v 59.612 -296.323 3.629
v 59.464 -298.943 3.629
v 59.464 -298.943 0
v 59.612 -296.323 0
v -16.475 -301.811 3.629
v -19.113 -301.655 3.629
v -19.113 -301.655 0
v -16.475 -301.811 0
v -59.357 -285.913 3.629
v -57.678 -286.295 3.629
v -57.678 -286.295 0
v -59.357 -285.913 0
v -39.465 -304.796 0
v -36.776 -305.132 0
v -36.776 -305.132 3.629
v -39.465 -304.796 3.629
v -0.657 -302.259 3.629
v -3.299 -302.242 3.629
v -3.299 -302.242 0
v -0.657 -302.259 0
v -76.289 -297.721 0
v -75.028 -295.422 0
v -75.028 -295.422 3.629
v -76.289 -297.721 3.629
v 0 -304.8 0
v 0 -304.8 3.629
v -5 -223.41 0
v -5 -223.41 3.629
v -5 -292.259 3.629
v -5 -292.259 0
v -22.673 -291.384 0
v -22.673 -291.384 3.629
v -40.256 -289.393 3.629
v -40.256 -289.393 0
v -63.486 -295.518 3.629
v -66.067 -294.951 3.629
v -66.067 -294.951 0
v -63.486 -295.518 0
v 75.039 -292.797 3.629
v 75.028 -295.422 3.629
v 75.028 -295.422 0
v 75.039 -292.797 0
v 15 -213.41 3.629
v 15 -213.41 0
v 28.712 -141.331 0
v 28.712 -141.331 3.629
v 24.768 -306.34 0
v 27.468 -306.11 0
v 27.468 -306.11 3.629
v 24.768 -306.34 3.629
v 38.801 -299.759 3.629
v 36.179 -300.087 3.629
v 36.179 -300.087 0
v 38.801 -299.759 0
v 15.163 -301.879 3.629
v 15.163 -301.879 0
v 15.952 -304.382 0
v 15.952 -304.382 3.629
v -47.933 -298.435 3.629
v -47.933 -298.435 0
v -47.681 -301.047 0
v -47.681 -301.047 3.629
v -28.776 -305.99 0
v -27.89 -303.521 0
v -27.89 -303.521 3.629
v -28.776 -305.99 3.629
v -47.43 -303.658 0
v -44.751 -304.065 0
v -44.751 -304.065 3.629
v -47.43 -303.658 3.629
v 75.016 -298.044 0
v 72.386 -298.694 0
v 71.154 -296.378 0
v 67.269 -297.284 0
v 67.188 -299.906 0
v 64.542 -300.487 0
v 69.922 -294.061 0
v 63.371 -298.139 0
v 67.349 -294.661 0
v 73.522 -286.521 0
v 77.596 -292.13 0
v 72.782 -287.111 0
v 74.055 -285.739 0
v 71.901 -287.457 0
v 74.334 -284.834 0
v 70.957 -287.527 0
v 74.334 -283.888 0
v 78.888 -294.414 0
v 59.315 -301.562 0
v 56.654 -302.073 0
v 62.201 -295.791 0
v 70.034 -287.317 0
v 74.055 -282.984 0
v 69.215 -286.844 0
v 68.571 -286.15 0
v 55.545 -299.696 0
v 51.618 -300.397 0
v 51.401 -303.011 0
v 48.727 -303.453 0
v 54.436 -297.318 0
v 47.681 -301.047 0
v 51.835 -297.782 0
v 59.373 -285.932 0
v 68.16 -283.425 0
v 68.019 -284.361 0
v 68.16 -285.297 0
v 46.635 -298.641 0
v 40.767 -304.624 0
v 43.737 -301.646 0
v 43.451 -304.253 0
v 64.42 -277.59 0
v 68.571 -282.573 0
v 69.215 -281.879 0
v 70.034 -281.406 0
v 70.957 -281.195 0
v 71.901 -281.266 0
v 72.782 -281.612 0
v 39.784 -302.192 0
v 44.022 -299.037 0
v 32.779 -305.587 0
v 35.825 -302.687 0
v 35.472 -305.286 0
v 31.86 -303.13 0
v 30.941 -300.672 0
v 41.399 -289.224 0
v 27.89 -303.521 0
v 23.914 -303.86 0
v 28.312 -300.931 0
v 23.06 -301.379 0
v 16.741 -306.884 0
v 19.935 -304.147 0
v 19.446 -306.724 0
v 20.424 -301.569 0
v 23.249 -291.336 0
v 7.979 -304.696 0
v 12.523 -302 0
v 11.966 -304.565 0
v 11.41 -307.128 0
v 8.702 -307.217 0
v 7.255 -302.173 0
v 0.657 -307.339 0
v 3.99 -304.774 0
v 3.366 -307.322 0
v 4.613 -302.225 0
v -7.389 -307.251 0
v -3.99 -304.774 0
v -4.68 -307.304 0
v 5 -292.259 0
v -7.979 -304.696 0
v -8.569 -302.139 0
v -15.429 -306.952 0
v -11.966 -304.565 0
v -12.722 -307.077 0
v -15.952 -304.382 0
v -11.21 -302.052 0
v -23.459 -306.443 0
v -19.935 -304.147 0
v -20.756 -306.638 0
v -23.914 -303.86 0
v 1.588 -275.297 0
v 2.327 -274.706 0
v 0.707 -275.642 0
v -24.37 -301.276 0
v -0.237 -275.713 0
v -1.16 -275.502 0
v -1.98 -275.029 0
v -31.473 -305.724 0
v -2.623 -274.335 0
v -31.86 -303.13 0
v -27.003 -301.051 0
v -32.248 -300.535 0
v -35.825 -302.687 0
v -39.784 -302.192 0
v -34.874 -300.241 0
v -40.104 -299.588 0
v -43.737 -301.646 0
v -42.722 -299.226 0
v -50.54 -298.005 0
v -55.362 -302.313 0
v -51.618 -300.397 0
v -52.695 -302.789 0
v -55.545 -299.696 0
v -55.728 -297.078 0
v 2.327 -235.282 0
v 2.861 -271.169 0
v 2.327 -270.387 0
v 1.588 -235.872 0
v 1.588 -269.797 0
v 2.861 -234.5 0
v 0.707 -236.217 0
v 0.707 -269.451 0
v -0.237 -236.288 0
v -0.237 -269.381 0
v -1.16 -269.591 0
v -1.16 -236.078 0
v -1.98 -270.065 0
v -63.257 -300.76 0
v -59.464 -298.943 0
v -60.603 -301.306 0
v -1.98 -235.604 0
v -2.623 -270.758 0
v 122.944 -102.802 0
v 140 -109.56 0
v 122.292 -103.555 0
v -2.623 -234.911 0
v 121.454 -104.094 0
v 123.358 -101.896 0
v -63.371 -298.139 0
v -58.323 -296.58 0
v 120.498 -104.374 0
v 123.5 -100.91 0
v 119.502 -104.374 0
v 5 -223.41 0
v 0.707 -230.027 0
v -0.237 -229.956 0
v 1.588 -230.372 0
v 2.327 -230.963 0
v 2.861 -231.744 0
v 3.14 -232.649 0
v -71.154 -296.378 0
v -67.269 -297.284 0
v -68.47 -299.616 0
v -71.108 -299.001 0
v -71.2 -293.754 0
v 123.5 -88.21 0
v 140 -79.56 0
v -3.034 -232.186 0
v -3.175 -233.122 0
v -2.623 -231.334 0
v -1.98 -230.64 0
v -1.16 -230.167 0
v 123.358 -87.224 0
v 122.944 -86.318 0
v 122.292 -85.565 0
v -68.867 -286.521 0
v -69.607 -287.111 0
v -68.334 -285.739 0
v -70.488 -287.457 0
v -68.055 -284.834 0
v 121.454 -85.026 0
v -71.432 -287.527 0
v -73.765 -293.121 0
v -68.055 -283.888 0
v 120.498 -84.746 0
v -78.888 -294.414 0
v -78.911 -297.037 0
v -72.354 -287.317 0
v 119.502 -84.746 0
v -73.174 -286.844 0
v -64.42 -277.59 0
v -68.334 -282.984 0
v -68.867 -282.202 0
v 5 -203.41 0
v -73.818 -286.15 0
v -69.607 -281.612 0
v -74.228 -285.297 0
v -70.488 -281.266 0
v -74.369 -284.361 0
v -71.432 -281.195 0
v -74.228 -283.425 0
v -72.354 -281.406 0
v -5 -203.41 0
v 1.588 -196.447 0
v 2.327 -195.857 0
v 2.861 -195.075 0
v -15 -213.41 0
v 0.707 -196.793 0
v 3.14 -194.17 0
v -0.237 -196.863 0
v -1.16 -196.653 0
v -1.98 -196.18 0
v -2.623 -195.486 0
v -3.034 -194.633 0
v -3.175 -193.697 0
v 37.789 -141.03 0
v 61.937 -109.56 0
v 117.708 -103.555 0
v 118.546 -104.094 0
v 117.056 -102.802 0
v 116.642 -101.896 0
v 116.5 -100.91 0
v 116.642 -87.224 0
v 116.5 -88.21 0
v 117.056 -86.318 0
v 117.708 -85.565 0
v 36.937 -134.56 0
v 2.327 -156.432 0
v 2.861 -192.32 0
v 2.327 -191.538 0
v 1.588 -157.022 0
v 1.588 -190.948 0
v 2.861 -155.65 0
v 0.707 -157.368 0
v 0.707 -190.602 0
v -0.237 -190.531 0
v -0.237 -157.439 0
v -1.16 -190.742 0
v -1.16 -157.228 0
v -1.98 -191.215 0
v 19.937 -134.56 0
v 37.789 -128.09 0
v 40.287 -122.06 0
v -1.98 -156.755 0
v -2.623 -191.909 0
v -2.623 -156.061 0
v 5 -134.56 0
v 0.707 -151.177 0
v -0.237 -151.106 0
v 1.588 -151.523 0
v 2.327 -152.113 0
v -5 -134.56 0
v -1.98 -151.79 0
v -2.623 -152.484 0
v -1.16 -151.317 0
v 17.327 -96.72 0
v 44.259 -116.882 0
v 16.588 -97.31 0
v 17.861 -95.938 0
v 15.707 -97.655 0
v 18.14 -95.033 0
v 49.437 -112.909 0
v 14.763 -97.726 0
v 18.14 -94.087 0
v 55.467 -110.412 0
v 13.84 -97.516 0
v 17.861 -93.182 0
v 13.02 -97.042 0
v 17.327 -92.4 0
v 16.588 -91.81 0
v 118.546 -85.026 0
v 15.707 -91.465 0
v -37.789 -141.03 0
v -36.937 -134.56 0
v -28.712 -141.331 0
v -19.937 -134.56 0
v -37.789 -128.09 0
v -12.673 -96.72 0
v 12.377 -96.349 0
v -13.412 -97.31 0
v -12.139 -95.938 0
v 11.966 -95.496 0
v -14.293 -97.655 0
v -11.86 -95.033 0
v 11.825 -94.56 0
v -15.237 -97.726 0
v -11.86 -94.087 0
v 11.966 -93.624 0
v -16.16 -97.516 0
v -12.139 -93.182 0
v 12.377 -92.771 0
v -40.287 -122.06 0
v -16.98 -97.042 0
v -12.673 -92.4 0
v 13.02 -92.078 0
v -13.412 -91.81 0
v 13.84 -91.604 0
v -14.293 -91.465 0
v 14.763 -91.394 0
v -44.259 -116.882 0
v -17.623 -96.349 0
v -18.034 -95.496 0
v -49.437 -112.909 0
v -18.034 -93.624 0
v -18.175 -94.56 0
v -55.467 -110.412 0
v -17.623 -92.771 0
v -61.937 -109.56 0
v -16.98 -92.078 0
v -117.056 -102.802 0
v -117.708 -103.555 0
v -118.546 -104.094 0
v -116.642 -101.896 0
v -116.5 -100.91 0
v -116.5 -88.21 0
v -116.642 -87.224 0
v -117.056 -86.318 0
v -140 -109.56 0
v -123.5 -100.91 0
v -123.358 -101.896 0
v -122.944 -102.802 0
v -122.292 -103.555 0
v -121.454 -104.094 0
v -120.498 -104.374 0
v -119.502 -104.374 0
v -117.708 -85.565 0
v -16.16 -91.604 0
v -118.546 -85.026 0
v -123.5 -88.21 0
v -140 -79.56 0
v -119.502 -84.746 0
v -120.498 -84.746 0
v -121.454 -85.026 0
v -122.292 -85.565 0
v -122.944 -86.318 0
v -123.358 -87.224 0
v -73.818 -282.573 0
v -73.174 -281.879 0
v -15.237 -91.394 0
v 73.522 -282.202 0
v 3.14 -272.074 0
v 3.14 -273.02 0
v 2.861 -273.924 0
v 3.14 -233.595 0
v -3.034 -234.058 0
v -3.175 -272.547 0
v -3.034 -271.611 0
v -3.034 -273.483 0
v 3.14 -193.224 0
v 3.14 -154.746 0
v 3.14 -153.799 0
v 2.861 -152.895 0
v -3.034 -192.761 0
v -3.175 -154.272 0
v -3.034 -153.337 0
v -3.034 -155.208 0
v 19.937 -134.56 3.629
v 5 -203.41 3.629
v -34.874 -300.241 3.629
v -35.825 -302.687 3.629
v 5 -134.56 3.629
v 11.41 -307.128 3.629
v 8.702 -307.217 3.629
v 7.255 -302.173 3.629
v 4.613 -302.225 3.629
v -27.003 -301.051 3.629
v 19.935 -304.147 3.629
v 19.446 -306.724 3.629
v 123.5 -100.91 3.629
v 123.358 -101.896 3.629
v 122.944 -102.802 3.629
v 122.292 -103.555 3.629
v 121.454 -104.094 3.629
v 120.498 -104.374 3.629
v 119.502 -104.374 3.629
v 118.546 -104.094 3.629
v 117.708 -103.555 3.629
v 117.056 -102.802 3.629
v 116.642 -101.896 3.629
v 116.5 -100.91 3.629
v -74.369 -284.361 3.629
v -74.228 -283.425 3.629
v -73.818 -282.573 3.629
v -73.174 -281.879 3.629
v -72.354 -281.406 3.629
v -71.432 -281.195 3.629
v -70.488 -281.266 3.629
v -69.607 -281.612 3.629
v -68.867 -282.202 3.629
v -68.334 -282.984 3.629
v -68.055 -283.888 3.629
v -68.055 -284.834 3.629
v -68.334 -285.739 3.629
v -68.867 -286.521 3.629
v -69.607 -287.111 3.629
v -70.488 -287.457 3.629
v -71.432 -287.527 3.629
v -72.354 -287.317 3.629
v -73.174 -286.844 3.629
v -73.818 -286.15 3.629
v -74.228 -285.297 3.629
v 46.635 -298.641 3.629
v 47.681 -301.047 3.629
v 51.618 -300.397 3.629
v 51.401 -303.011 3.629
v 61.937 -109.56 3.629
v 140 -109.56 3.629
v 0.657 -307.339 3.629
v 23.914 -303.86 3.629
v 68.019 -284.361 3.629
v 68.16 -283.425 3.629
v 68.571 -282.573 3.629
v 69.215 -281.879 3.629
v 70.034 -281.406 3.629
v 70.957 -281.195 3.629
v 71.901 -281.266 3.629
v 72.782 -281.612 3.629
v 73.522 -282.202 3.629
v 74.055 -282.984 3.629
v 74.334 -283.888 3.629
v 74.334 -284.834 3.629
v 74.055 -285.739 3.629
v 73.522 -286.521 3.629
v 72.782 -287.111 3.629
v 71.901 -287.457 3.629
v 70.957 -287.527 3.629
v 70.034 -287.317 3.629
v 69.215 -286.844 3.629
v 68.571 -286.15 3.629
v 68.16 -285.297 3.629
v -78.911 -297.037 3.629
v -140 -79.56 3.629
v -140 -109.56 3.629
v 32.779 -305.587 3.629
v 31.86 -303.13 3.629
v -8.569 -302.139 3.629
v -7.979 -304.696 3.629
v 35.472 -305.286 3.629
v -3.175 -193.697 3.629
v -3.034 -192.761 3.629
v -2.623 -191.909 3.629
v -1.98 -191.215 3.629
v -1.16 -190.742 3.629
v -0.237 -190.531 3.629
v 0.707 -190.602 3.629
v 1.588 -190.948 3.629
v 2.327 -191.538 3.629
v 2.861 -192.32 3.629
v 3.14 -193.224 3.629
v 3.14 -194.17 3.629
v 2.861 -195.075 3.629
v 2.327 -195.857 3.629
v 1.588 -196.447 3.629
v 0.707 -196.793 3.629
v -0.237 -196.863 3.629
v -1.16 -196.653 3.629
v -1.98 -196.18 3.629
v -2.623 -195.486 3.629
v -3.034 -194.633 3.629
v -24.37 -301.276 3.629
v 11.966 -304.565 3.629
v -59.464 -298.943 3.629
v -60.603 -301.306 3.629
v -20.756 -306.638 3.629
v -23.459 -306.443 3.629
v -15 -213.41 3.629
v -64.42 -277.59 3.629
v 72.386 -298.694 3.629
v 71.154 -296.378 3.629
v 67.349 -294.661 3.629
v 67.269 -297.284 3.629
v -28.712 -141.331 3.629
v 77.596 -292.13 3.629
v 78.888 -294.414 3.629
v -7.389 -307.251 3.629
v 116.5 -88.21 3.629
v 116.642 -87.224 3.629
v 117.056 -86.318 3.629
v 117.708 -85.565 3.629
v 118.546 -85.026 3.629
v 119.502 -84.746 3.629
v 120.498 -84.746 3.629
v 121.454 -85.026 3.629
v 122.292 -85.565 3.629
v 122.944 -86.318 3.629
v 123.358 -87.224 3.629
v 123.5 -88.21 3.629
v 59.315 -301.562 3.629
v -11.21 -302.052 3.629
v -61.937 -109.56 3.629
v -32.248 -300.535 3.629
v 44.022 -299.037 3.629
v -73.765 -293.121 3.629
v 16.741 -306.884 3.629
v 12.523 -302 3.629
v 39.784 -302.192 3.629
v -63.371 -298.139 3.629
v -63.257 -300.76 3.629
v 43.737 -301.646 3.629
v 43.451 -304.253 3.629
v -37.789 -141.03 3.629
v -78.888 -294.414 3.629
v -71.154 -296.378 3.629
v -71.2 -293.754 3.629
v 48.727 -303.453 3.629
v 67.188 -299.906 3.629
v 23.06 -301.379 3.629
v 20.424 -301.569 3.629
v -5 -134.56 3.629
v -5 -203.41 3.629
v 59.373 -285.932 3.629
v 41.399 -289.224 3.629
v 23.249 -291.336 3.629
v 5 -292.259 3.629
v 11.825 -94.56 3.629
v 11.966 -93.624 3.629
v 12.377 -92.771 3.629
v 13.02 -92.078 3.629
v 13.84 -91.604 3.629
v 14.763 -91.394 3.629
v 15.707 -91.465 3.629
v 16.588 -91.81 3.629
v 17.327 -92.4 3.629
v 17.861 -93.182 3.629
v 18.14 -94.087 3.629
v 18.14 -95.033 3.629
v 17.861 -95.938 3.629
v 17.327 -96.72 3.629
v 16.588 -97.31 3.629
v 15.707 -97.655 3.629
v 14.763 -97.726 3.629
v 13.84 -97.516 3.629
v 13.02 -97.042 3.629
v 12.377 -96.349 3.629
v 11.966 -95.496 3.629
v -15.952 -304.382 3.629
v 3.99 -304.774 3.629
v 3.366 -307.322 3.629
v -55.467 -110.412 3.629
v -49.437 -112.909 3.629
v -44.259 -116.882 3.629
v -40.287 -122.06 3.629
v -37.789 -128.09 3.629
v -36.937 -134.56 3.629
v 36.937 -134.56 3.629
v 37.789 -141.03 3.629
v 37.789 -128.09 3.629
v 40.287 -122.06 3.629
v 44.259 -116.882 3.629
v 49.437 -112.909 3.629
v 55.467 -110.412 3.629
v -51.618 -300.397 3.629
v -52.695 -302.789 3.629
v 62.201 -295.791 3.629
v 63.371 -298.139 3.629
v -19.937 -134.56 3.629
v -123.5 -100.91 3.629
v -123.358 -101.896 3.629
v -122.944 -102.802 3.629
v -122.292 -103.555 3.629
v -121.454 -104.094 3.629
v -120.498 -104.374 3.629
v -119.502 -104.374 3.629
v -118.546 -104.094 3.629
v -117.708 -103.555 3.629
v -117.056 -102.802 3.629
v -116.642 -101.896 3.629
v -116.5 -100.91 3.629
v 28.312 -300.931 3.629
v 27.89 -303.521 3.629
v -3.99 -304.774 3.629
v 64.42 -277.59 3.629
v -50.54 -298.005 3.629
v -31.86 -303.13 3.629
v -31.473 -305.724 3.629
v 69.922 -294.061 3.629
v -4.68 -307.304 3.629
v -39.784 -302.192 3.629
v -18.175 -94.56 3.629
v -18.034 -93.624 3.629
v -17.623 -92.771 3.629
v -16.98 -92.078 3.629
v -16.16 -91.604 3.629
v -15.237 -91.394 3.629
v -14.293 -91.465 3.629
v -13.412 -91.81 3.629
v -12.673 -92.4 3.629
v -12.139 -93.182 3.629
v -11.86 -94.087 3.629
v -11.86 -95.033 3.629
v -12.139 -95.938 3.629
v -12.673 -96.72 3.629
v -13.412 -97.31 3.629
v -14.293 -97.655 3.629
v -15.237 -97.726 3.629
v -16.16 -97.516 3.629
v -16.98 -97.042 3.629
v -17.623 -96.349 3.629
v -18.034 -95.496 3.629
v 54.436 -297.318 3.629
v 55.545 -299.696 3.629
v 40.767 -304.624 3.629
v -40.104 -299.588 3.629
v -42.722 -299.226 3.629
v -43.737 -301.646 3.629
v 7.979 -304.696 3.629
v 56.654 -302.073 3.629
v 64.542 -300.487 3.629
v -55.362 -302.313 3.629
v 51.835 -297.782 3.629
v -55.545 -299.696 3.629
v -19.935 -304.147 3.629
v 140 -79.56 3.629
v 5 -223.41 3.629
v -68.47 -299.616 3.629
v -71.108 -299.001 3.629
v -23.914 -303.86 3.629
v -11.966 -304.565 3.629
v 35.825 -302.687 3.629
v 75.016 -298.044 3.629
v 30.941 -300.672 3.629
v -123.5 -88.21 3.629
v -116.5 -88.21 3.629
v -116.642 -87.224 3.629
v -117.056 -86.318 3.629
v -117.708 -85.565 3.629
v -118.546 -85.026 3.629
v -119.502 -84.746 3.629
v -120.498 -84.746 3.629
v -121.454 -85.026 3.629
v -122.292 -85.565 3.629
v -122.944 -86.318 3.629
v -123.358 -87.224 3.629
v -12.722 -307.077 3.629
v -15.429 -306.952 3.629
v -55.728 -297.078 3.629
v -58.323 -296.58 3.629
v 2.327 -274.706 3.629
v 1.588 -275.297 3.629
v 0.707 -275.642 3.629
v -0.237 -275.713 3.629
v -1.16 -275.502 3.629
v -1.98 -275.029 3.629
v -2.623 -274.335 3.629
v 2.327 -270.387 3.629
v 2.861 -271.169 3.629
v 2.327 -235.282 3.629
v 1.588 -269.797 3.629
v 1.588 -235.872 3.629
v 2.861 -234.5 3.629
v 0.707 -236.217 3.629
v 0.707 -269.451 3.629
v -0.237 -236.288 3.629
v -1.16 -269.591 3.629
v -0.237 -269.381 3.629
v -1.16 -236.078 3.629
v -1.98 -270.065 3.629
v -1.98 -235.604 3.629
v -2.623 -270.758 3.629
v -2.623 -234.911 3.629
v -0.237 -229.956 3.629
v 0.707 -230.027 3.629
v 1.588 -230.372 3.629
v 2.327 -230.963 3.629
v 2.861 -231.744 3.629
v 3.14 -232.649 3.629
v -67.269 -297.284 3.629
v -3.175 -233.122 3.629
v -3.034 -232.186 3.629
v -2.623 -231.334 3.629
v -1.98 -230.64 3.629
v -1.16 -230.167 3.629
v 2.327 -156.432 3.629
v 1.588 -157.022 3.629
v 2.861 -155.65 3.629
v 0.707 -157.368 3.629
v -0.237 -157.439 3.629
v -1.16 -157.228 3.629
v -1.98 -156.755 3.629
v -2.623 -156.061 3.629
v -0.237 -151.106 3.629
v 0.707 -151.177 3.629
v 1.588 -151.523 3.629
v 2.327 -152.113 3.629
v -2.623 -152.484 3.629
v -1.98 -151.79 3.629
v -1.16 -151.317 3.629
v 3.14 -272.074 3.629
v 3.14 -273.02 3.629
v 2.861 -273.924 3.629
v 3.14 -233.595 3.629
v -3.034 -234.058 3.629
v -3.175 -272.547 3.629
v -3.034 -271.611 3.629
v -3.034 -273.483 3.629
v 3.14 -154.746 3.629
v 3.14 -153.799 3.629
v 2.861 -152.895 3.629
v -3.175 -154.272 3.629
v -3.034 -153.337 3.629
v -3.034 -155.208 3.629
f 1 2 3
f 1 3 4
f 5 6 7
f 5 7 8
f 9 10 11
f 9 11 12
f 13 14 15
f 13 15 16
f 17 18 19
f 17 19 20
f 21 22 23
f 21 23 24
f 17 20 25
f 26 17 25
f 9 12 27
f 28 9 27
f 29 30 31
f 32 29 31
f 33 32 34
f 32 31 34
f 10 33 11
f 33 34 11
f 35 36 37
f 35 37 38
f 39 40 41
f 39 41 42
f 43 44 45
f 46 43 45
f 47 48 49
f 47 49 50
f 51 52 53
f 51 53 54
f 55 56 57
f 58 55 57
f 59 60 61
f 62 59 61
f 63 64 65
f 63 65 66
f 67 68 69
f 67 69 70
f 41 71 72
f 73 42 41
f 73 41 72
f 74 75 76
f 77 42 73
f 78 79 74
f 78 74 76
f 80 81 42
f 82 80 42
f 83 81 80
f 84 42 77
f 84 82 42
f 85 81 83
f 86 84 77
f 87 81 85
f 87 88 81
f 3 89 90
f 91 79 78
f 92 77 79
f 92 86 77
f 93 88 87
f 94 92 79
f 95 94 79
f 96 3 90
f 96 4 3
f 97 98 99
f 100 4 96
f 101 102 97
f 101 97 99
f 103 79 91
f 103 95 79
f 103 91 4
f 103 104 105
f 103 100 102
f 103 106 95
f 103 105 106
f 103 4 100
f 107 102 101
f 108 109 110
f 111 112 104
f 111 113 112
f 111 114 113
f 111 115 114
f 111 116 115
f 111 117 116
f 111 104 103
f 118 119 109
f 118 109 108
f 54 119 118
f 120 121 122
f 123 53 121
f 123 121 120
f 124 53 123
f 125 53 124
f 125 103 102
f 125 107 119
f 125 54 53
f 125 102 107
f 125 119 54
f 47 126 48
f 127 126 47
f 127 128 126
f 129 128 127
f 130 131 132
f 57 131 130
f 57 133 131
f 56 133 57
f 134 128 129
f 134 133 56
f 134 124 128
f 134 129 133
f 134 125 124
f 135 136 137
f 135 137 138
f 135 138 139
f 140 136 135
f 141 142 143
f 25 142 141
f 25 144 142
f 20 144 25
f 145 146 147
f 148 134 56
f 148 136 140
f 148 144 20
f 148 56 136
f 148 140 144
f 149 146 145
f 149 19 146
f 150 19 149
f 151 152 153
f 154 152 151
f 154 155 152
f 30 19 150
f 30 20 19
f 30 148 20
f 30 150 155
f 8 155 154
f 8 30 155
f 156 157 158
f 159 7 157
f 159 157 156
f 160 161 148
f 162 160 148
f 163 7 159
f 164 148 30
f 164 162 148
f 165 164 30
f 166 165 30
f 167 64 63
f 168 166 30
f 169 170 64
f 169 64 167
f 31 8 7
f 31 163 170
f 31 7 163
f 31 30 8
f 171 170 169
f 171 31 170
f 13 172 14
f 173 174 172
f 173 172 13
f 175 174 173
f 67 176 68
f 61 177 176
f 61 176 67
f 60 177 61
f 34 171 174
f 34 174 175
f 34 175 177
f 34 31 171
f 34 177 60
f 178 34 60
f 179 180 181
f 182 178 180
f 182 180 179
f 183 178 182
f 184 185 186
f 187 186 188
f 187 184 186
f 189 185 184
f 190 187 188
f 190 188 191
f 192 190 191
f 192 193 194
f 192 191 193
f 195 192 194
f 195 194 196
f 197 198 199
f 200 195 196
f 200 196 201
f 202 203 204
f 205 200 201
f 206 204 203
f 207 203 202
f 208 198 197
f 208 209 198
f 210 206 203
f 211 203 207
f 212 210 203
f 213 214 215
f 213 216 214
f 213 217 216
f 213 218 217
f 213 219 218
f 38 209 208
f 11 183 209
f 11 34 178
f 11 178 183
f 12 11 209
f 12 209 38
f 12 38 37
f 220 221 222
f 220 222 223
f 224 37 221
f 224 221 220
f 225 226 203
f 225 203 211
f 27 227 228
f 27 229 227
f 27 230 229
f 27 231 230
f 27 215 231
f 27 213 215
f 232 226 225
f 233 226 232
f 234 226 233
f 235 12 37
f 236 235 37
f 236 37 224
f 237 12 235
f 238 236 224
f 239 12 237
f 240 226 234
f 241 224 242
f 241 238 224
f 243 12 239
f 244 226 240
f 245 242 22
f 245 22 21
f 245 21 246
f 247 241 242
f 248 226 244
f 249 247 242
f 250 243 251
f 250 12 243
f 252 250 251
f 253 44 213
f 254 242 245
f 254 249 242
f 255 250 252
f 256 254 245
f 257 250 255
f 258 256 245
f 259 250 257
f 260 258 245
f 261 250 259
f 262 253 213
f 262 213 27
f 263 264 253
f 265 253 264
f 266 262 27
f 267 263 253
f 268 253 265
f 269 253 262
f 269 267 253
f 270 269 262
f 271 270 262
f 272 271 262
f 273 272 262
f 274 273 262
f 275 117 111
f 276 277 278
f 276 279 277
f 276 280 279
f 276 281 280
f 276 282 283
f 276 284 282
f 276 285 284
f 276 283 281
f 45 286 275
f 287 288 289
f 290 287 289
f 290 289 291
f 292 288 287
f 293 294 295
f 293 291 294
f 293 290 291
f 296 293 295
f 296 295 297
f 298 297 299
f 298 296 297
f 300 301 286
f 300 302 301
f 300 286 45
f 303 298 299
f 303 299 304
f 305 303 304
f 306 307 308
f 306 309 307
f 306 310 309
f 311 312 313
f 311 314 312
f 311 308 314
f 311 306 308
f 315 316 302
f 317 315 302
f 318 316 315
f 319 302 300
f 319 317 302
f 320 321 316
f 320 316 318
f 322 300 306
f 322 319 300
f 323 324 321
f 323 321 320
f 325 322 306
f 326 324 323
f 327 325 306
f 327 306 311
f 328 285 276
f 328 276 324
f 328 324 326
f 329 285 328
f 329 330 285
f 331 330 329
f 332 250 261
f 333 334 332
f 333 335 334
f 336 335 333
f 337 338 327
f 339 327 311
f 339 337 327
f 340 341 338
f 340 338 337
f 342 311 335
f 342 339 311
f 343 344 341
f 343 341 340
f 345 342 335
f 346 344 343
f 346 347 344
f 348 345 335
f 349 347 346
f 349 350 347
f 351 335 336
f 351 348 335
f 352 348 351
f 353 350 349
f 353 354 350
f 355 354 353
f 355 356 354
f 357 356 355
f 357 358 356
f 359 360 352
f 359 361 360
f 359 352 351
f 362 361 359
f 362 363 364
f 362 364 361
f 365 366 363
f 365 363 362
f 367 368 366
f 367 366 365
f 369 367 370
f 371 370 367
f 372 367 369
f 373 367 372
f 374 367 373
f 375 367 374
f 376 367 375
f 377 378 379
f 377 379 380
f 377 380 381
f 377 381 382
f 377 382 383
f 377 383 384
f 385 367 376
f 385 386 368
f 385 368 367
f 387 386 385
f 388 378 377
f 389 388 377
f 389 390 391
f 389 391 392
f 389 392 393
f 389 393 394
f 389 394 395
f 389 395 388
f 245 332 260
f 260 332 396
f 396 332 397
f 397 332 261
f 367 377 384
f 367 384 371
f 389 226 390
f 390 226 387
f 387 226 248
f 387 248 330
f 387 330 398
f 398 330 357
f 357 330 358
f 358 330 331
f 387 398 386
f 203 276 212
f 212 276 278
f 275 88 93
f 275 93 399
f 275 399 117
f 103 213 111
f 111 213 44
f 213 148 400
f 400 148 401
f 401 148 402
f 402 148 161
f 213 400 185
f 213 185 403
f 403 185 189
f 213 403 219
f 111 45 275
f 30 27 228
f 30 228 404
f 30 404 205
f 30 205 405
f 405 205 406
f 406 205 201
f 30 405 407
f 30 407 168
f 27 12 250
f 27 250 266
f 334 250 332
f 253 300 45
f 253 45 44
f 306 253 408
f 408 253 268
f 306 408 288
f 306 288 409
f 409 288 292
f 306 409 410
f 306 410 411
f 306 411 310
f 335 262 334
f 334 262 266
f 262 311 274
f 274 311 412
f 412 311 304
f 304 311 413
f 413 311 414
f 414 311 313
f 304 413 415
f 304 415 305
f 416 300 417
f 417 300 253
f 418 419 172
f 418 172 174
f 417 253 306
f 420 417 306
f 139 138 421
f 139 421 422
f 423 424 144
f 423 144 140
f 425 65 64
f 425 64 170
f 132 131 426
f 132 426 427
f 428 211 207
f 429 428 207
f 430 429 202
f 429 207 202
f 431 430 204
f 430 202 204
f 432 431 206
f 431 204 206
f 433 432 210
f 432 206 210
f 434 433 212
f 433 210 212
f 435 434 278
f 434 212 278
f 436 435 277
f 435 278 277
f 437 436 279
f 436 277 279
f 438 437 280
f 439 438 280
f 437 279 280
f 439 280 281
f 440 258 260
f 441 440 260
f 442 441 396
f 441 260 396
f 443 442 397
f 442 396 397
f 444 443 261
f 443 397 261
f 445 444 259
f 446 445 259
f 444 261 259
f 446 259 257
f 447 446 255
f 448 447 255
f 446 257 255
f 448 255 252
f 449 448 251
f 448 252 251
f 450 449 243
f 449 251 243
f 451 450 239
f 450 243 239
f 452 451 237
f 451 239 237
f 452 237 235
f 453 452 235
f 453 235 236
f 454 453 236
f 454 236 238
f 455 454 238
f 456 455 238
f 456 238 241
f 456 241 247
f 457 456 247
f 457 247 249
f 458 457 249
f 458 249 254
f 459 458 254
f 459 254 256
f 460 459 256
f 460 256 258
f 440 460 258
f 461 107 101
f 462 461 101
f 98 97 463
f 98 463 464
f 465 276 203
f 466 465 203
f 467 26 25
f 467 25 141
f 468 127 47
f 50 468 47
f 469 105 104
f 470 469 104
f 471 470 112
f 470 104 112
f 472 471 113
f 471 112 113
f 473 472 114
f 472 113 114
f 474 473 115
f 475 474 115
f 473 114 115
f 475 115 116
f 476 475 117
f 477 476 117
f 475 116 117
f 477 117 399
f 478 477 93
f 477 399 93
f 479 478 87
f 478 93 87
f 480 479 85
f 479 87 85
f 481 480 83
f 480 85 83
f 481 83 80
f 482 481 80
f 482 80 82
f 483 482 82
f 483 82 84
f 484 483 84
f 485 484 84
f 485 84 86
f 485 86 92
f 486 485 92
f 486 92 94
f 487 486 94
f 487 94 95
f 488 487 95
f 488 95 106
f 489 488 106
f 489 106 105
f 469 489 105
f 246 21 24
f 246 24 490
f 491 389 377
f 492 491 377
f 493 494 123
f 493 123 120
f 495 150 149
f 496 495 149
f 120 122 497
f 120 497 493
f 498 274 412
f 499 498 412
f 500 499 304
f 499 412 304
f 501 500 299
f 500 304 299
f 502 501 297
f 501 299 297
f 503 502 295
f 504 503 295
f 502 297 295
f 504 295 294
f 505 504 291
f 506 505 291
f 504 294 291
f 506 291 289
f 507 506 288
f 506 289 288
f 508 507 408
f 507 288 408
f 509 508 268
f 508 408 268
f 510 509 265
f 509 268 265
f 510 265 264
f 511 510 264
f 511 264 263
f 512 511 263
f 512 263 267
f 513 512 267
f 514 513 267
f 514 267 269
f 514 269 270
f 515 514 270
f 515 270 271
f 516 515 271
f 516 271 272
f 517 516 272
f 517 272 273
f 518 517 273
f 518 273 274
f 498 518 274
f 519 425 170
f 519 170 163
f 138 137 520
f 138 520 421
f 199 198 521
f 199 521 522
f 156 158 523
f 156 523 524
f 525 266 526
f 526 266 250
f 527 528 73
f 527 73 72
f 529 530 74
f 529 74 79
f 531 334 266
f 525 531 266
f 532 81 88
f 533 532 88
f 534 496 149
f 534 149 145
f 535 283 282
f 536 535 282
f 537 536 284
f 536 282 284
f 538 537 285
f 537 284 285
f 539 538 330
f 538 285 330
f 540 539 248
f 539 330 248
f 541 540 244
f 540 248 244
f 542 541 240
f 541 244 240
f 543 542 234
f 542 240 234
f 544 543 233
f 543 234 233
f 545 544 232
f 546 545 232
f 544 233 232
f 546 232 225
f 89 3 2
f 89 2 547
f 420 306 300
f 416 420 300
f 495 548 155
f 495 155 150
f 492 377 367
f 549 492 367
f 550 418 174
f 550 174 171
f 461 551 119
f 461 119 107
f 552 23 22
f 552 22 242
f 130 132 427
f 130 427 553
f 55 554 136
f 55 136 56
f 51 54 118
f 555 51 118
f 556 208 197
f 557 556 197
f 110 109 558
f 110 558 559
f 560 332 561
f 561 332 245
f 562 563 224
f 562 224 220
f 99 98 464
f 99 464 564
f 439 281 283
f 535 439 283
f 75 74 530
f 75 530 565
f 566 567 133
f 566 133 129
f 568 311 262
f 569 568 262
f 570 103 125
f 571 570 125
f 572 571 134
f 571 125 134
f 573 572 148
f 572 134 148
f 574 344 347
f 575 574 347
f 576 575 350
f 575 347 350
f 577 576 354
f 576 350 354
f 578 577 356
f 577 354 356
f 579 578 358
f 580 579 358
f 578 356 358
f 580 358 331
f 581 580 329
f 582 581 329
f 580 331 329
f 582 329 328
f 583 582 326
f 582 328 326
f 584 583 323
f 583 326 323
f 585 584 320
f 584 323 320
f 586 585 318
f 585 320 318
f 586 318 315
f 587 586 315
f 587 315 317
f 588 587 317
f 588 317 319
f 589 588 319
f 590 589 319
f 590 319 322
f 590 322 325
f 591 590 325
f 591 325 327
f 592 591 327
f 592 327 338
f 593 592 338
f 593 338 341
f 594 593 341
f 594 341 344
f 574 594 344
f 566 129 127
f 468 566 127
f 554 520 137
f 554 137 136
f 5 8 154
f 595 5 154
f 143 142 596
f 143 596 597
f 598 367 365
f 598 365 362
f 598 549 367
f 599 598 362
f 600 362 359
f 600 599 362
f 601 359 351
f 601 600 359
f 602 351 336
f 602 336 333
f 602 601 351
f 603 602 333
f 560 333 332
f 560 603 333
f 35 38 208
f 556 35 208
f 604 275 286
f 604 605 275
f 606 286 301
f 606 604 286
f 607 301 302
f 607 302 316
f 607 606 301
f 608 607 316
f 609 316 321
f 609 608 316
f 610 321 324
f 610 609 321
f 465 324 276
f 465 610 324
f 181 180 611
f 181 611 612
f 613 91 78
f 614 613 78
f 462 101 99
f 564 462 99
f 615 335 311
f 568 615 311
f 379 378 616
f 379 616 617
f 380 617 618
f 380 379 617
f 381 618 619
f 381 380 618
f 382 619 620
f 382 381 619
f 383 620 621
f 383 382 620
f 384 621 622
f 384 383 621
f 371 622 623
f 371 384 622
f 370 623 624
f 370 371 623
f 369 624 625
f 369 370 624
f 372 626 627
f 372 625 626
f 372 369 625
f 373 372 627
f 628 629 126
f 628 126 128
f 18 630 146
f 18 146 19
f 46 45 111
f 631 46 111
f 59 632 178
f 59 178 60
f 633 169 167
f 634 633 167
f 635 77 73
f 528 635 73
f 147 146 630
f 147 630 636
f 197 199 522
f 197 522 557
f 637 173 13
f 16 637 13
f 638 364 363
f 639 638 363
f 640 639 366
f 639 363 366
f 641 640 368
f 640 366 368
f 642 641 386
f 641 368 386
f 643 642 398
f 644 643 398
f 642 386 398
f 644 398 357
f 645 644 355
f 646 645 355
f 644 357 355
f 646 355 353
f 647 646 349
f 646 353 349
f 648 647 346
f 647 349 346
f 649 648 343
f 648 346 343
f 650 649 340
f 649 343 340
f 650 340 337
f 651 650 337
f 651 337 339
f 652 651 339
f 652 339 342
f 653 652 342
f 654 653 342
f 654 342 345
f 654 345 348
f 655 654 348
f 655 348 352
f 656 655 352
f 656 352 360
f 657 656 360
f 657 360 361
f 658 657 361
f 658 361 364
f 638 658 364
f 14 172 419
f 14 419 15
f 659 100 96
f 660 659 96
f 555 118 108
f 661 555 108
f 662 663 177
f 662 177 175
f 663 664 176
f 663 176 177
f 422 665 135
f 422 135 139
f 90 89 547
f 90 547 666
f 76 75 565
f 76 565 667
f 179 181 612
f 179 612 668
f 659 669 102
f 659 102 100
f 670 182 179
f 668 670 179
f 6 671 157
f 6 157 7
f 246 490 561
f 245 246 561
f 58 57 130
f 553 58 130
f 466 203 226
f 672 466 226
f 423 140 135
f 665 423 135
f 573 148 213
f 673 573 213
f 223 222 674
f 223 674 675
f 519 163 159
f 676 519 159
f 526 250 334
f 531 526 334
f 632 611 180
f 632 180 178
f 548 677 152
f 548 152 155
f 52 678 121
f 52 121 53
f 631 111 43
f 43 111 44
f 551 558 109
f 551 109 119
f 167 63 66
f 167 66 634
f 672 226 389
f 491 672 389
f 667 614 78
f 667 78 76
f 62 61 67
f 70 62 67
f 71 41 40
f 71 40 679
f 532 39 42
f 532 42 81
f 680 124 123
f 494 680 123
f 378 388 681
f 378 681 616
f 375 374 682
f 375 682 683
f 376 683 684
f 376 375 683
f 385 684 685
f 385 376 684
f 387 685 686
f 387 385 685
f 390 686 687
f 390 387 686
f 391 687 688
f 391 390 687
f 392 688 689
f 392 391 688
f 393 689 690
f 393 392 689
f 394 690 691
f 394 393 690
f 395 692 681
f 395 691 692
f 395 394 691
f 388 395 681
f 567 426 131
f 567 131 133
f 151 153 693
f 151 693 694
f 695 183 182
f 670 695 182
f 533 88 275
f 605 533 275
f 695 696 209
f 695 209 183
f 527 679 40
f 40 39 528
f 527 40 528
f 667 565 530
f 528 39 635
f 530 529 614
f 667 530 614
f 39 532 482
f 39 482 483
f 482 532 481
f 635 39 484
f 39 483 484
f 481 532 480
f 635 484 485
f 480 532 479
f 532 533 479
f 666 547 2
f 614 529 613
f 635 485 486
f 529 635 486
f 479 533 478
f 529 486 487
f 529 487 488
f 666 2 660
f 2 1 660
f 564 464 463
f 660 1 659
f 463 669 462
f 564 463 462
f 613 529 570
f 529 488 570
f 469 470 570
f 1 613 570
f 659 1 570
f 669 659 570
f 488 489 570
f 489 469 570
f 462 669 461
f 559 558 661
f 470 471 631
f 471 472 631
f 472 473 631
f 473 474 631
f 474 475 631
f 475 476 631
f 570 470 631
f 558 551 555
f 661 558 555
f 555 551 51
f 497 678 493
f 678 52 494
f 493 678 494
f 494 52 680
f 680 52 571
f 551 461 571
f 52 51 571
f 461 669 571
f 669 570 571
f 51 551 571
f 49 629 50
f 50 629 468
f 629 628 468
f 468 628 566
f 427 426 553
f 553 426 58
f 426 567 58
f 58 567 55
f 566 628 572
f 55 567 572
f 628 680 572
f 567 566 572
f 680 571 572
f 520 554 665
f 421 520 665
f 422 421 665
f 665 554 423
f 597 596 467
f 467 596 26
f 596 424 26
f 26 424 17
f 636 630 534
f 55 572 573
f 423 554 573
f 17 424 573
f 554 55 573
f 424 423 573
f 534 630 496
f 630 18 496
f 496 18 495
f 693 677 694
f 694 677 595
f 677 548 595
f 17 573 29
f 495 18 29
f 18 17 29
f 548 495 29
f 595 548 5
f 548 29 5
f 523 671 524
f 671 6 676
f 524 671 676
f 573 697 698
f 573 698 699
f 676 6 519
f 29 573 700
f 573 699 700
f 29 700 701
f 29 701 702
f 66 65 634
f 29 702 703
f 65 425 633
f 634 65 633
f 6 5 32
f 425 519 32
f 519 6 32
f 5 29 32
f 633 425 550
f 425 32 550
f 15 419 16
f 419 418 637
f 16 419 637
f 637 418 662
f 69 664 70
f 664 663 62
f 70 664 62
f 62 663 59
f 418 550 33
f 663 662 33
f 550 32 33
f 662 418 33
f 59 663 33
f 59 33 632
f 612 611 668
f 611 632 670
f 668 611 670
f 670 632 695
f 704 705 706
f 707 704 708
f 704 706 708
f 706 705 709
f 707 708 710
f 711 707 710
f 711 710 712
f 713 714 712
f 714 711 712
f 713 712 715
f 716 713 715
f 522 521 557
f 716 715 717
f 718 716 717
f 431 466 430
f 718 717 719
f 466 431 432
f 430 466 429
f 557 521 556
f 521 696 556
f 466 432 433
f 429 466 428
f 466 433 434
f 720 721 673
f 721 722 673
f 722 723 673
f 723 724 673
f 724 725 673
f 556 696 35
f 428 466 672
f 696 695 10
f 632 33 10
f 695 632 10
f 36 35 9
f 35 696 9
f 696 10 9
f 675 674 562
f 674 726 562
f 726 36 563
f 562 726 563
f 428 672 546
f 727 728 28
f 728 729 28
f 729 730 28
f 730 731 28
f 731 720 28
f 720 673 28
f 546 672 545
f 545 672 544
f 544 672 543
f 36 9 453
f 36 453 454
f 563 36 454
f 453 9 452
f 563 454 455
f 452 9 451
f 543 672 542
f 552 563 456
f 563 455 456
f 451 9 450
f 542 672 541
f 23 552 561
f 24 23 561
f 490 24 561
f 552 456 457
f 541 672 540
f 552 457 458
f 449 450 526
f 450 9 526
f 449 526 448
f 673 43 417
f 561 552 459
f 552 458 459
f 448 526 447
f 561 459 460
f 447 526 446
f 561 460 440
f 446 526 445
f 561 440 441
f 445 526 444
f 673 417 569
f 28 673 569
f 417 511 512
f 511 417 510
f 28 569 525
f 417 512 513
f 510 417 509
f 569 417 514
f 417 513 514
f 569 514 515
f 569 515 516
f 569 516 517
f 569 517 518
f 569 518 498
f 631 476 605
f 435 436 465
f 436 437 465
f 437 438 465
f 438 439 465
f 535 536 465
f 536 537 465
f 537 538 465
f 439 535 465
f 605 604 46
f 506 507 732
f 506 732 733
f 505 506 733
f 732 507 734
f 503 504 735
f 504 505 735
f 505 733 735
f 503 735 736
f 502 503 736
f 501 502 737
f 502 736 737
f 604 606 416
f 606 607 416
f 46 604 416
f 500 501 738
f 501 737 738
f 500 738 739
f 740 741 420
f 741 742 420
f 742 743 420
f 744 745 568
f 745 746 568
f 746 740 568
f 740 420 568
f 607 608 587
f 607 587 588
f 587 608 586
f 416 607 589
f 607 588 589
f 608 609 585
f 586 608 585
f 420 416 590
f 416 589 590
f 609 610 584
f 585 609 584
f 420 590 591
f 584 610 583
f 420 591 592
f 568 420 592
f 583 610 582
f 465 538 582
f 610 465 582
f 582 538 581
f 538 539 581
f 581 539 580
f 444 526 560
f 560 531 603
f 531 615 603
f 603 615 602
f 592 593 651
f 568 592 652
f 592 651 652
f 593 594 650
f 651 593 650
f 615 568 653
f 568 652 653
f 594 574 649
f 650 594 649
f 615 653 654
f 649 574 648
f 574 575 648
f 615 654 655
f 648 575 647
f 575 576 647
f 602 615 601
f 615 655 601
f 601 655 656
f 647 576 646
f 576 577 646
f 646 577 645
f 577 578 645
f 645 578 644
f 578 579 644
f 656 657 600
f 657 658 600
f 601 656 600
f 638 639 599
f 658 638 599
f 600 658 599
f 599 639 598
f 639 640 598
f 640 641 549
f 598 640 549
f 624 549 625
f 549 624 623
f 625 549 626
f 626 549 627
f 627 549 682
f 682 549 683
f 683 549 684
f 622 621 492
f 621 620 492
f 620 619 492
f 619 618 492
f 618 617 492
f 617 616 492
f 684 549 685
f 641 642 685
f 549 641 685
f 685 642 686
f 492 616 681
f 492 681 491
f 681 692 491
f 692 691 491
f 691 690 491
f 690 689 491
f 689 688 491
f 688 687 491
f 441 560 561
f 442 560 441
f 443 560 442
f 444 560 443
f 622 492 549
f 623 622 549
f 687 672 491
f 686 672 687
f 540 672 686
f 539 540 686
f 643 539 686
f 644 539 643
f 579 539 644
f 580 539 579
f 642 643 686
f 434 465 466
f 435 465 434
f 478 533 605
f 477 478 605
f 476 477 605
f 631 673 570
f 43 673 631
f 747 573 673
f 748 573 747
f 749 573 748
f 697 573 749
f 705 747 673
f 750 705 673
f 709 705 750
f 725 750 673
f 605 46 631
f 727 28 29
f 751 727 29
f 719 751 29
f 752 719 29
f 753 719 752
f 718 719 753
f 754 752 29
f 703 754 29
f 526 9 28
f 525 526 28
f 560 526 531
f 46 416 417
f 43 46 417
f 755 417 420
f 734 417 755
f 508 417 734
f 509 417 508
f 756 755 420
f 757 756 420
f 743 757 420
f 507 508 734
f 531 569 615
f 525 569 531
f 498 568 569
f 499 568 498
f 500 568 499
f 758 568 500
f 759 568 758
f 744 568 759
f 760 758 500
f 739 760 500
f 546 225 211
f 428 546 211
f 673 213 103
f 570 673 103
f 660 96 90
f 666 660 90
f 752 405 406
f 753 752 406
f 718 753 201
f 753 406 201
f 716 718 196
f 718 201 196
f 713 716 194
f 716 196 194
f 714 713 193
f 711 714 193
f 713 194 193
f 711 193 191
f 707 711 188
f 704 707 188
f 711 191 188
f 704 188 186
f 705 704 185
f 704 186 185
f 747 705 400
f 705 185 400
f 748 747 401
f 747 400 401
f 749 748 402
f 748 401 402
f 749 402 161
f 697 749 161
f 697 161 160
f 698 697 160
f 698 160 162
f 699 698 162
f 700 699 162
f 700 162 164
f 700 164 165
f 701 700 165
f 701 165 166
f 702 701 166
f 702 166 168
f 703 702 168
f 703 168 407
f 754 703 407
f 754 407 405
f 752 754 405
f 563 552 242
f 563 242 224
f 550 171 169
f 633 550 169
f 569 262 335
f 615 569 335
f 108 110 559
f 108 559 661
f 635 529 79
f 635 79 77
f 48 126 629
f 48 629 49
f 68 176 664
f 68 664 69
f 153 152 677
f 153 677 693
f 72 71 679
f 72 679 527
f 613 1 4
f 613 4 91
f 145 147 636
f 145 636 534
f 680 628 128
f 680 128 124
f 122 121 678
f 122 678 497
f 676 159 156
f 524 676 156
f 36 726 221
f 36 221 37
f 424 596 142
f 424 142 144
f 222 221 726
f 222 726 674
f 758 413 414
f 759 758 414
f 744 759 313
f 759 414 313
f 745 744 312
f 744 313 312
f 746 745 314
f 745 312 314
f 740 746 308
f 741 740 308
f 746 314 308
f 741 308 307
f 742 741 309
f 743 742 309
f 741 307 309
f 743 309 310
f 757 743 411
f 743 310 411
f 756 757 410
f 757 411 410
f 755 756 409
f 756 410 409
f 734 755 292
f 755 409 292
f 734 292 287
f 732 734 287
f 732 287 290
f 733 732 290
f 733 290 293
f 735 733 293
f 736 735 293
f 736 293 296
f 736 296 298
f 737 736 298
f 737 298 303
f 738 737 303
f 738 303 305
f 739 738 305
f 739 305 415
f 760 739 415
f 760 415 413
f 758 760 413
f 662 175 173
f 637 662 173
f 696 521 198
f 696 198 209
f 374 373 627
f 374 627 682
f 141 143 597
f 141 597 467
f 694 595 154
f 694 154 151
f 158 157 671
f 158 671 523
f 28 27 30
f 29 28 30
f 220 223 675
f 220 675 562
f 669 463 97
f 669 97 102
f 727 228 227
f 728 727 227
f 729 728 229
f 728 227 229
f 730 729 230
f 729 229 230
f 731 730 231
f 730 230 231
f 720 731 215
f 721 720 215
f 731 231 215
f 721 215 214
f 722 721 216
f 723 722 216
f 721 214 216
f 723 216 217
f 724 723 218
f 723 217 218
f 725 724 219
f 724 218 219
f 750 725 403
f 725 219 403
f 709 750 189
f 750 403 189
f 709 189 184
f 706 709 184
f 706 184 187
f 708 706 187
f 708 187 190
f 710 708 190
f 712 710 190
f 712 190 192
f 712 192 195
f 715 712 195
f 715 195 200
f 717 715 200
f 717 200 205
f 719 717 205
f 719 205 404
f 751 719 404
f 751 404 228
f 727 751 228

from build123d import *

# Parameters (mm, degrees)
BOSS_EXTRUDE2_DEPTH = 3.628571429
FILLET1_R           = 25
BOSS_EXTRUDE4_DEPTH = 3.628571429
CUT_EXTRUDE2_DEPTH  = 336.434355024
CIRPATTERN8_COUNT   = 20
CIRPATTERN8_ANGLE   = 28.5
SKETCH5_R           = 3.175
CUT_EXTRUDE3_DEPTH  = 338.743409804
SKETCH17_R          = 3.175
CUT_EXTRUDE4_DEPTH  = 338.743409804


with BuildPart() as part:
    # Sketch3 → Boss-Extrude2 (new body)
    with BuildSketch(Plane.XY):
        with BuildLine():
            Line((-140, -79.56), (-140, -109.56))
            Line((-140, -109.56), (-29.356513523, -109.56))
            Line((-29.356513523, -109.56), (-78.888044947, -294.414191853))
            ThreePointArc((-78.888044947, -294.414191853), (0, -304.8), (78.888044947, -294.414191853))
            Line((78.888044947, -294.414191853), (29.356513523, -109.56))
            Line((29.356513523, -109.56), (140, -109.56))
            Line((140, -109.56), (140, -79.56))
            Line((140, -79.56), (-140, -79.56))
        make_face()
    extrude(amount=BOSS_EXTRUDE2_DEPTH)

    # Fillet1
    fillet1_edges = [part.edges().sort_by_distance(p)[0] for p in [
        (29.356513523, -109.56, 1.814285714),
        (-29.356513523, -109.56, 1.814285714),
    ]]
    fillet(fillet1_edges, radius=FILLET1_R)

    # Sketch14 → Boss-Extrude4 (add)
    with BuildSketch(Plane(origin=(0, 0, 0), x_dir=(-1, 0, 0), z_dir=(0, 0, -1))):
        with BuildLine():
            Line((78.910933272, -297.036934084), (78.888044947, -294.414191853))
            ThreePointArc((78.888044947, -294.414191853), (76.959432674, -294.924203351), (75.027523715, -295.421581279))
            Line((75.027523715, -295.421581279), (76.289081309, -297.721097125))
            Line((76.289081309, -297.721097125), (78.910933272, -297.036934084))
        make_face()
    boss_extrude4 = extrude(amount=-BOSS_EXTRUDE4_DEPTH)

    # Sketch16 → Cut-Extrude2 (cut, symmetric)
    with BuildSketch(Plane(origin=(0, 0, 0), x_dir=(-1, 0, 0), z_dir=(0, 0, -1))):
        Polygon((372.937709596, -838.440145613), (75.027523715, -295.421581279), (73.765262731, -293.12078332), (71.19993834, -293.754449124), (71.154137831, -296.378353915), (60.344615656, -915.654378233), (357.400151379, -2118.250141136), (669.993245319, -2041.035908516), align=None)
    cut_extrude2 = extrude(amount=CUT_EXTRUDE2_DEPTH, both=True, mode=Mode.SUBTRACT)

    # CirPattern8: Boss-Extrude4, Cut-Extrude2 ×20 about axis
    cirpattern8_axis = Axis((0, 0, 0), (0, 0, 1))
    add([boss_extrude4.rotate(cirpattern8_axis, i * CIRPATTERN8_ANGLE / (CIRPATTERN8_COUNT - 1)) for i in range(1, CIRPATTERN8_COUNT)])
    add([cut_extrude2.rotate(cirpattern8_axis, i * CIRPATTERN8_ANGLE / (CIRPATTERN8_COUNT - 1)) for i in range(1, CIRPATTERN8_COUNT)], mode=Mode.SUBTRACT)

    # Sketch5 → Cut-Extrude3 (cut, through all)
    with BuildSketch(Plane(origin=(0, 0, 0), x_dir=(-1, 0, 0), z_dir=(0, 0, -1))):
        with Locations((-15, -94.56)):
            Circle(SKETCH5_R)
        with Locations((15, -94.56)):
            Circle(SKETCH5_R)
        with BuildLine():
            Line((-123.5, -94.56), (-123.5, -100.91))
            ThreePointArc((-123.5, -100.91), (-120, -104.41), (-116.5, -100.91))
            Line((-116.5, -100.91), (-116.5, -94.56))
            Line((-116.5, -94.56), (-116.5, -88.21))
            ThreePointArc((-116.5, -88.21), (-120, -84.71), (-123.5, -88.21))
            Line((-123.5, -88.21), (-123.5, -94.56))
        make_face()
        with BuildLine():
            Line((116.5, -94.56), (116.5, -88.21))
            ThreePointArc((116.5, -88.21), (120, -84.71), (123.5, -88.21))
            Line((123.5, -88.21), (123.5, -94.56))
            Line((123.5, -94.56), (123.5, -100.91))
            ThreePointArc((123.5, -100.91), (120, -104.41), (116.5, -100.91))
            Line((116.5, -100.91), (116.5, -94.56))
        make_face()
    extrude(amount=-CUT_EXTRUDE3_DEPTH, mode=Mode.SUBTRACT)

    # Sketch17 → Cut-Extrude4 (cut, through all)
    with BuildSketch(Plane(origin=(0, 0, 0), x_dir=(-1, 0, 0), z_dir=(0, 0, -1))):
        Polygon((-28.711660115, -141.33134449), (-64.419853025, -277.589898046), (-15, -213.409642912), align=None)
        Polygon((15, -213.409642912), (64.419853025, -277.589898046), (28.711660115, -141.33134449), align=None)
        with BuildLine():
            Line((57.677925946, -286.294618468), (59.356743472, -285.913498464))
            Line((59.356743472, -285.913498464), (5, -223.409642912))
            Line((5, -223.409642912), (5, -292.259285824))
            ThreePointArc((5, -292.259285824), (31.480548191, -290.527384931), (57.677925946, -286.294618468))
        make_face()
        with BuildLine():
            Line((-5, -223.409642912), (-59.372890863, -285.932066063))
            ThreePointArc((-59.372890863, -285.932066063), (-32.341547535, -290.428544105), (-5, -292.259285824))
            Line((-5, -292.259285824), (-5, -223.409642912))
        make_face()
        Polygon((5, -203.409642912), (19.937147844, -134.56), (5, -134.56), align=None)
        Polygon((-19.937147844, -134.56), (-5, -203.409642912), (-5, -134.56), align=None)
        with Locations((0, -193.697232184)):
            Circle(SKETCH17_R)
        with Locations((0, -154.272410728)):
            Circle(SKETCH17_R)
        with Locations((0, -233.12205364)):
            Circle(SKETCH17_R)
        with Locations((0, -272.546875096)):
            Circle(SKETCH17_R)
        with Locations((71.194365296, -284.361242536)):
            Circle(SKETCH17_R)
        with Locations((-71.194365296, -284.361242536)):
            Circle(SKETCH17_R)
    extrude(amount=-CUT_EXTRUDE4_DEPTH, mode=Mode.SUBTRACT)


solid = part.part
